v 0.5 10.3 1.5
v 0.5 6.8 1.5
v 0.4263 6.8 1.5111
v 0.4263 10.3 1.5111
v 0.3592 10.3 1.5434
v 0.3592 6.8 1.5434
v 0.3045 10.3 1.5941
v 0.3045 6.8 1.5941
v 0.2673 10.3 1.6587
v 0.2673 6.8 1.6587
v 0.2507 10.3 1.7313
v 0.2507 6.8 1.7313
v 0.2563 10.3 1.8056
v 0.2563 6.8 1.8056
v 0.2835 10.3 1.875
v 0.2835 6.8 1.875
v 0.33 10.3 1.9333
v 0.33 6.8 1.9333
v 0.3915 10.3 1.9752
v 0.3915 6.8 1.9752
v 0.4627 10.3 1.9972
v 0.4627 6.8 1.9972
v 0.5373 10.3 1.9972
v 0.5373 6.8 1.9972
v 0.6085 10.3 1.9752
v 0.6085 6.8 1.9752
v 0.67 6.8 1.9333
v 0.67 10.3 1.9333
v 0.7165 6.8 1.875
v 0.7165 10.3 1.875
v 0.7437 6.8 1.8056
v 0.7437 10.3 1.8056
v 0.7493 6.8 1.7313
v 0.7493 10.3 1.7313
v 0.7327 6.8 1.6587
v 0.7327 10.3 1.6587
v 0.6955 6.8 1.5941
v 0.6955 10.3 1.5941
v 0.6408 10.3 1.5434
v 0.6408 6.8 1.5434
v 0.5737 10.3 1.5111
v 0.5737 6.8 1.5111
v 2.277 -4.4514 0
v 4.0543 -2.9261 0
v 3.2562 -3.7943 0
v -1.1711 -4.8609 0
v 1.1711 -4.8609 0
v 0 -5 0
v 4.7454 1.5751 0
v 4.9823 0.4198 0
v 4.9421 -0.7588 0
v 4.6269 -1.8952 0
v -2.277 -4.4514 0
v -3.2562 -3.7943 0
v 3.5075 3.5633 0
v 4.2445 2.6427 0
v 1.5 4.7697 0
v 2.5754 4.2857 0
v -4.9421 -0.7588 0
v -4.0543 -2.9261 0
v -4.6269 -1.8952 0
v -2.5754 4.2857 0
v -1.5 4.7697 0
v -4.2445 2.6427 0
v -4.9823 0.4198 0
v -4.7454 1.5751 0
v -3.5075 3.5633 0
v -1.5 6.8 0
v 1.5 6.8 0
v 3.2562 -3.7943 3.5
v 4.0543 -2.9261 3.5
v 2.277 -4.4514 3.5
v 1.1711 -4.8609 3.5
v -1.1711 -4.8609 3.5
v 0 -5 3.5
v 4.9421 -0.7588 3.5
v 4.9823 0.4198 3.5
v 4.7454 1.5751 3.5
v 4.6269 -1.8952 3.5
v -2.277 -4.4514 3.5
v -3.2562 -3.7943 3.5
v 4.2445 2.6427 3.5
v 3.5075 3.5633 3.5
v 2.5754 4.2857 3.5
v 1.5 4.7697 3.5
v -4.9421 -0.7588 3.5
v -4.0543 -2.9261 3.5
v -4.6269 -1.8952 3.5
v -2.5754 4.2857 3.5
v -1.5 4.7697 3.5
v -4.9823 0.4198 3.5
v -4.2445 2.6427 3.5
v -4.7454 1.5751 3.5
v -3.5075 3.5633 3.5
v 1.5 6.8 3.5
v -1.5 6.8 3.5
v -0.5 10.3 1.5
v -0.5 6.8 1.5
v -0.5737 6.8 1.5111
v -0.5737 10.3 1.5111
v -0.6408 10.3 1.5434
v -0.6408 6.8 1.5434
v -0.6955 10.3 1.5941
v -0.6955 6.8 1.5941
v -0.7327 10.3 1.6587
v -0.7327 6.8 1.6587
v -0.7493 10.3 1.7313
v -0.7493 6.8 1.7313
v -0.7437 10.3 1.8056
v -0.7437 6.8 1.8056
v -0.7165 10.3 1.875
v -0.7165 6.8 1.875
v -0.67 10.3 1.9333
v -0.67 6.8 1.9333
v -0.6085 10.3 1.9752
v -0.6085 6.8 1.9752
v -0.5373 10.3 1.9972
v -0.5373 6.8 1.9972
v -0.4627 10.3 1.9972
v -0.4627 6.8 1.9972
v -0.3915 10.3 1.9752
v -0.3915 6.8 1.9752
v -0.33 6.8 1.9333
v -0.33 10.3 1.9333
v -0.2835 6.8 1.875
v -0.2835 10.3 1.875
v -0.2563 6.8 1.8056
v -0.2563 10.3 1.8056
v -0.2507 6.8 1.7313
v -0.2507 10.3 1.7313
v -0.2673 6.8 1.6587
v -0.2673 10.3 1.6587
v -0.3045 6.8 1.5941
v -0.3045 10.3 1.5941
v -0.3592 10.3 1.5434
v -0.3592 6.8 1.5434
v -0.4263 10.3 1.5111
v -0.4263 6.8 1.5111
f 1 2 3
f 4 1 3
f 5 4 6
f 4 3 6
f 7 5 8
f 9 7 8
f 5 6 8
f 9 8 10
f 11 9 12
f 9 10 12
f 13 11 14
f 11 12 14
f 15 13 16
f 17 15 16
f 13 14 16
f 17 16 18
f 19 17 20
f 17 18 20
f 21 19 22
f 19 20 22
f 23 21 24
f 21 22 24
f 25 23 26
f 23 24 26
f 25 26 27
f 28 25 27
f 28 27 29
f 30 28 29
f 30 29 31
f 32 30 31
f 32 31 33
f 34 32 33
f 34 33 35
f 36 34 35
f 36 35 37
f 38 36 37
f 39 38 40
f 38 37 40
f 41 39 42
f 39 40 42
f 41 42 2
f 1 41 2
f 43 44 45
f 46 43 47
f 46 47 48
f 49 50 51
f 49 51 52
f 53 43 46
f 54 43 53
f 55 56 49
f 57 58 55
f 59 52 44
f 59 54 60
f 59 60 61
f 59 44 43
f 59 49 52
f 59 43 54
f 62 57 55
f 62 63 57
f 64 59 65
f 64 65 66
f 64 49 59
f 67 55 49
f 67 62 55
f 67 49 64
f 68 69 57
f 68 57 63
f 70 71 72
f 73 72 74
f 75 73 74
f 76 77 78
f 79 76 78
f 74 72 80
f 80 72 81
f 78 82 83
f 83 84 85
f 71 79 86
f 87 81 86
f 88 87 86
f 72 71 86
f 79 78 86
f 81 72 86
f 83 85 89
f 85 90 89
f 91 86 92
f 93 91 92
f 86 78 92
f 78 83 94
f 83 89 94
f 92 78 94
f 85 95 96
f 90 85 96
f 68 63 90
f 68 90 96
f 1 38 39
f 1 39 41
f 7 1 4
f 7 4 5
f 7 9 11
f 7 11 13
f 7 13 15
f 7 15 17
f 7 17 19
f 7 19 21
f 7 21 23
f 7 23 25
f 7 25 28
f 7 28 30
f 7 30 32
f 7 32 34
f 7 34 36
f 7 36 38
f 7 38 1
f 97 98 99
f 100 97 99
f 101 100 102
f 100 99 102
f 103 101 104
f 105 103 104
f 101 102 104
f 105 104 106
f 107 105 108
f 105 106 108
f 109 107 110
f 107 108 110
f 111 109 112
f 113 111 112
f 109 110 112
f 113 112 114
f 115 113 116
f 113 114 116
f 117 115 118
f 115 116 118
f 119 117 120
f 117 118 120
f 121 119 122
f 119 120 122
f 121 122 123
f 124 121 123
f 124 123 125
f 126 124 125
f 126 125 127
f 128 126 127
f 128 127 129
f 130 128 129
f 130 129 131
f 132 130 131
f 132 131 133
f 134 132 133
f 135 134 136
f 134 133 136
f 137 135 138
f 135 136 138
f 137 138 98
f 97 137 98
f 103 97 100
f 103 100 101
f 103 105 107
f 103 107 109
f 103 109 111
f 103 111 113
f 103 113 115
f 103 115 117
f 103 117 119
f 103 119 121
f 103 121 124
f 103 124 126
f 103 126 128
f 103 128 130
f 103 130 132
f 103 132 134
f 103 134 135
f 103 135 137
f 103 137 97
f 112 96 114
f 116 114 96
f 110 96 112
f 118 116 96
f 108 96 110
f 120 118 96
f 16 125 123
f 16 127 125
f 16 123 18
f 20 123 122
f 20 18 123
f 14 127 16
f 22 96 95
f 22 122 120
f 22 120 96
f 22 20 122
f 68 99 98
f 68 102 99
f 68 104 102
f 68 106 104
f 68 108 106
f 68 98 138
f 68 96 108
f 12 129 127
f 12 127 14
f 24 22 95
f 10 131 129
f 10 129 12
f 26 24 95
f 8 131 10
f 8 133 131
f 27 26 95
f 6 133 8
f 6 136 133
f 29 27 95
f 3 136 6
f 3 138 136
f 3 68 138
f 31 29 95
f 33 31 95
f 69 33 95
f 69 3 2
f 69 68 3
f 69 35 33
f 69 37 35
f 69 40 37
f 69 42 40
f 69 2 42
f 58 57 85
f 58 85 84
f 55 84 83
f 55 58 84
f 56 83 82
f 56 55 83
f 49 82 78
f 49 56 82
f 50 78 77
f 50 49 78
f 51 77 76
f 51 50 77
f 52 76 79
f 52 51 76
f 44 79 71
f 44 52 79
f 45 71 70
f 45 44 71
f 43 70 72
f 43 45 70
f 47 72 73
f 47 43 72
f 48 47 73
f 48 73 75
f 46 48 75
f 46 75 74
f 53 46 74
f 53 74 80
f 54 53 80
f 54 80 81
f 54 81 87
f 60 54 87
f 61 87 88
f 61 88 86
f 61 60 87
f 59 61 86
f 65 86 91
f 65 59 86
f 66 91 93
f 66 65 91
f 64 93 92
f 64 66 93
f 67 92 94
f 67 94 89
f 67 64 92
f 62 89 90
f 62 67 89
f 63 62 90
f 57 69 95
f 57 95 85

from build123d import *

# Parameters (mm, degrees)
BOSS_EXTRUDE1_DEPTH = 3.5
SKETCH2_R           = 0.25
BOSS_EXTRUDE2_DEPTH = 3.5


with BuildPart() as part:
    # Sketch1 → Boss-Extrude1 (new body)
    with BuildSketch(Plane.XY):
        with BuildLine():
            Line((-1.5, 4.769696007), (-1.5, 6.8))
            Line((-1.5, 6.8), (1.5, 6.8))
            Line((1.5, 6.8), (1.5, 4.769696007))
            ThreePointArc((1.5, 4.769696007), (0, -5), (-1.5, 4.769696007))
        make_face()
    extrude(amount=BOSS_EXTRUDE1_DEPTH)

    # Sketch2 → Boss-Extrude2 (add)
    with BuildSketch(Plane(origin=(0, 6.8, 0), x_dir=(1, 0, 0), z_dir=(0, 1, 0))):
        with Locations(Location((-0.5, -1.75, 0), (0, 0, 90))):
            Circle(SKETCH2_R)
        with Locations(Location((0.5, -1.75, 0), (0, 0, 90))):
            Circle(SKETCH2_R)
    extrude(amount=BOSS_EXTRUDE2_DEPTH)


solid = part.part
